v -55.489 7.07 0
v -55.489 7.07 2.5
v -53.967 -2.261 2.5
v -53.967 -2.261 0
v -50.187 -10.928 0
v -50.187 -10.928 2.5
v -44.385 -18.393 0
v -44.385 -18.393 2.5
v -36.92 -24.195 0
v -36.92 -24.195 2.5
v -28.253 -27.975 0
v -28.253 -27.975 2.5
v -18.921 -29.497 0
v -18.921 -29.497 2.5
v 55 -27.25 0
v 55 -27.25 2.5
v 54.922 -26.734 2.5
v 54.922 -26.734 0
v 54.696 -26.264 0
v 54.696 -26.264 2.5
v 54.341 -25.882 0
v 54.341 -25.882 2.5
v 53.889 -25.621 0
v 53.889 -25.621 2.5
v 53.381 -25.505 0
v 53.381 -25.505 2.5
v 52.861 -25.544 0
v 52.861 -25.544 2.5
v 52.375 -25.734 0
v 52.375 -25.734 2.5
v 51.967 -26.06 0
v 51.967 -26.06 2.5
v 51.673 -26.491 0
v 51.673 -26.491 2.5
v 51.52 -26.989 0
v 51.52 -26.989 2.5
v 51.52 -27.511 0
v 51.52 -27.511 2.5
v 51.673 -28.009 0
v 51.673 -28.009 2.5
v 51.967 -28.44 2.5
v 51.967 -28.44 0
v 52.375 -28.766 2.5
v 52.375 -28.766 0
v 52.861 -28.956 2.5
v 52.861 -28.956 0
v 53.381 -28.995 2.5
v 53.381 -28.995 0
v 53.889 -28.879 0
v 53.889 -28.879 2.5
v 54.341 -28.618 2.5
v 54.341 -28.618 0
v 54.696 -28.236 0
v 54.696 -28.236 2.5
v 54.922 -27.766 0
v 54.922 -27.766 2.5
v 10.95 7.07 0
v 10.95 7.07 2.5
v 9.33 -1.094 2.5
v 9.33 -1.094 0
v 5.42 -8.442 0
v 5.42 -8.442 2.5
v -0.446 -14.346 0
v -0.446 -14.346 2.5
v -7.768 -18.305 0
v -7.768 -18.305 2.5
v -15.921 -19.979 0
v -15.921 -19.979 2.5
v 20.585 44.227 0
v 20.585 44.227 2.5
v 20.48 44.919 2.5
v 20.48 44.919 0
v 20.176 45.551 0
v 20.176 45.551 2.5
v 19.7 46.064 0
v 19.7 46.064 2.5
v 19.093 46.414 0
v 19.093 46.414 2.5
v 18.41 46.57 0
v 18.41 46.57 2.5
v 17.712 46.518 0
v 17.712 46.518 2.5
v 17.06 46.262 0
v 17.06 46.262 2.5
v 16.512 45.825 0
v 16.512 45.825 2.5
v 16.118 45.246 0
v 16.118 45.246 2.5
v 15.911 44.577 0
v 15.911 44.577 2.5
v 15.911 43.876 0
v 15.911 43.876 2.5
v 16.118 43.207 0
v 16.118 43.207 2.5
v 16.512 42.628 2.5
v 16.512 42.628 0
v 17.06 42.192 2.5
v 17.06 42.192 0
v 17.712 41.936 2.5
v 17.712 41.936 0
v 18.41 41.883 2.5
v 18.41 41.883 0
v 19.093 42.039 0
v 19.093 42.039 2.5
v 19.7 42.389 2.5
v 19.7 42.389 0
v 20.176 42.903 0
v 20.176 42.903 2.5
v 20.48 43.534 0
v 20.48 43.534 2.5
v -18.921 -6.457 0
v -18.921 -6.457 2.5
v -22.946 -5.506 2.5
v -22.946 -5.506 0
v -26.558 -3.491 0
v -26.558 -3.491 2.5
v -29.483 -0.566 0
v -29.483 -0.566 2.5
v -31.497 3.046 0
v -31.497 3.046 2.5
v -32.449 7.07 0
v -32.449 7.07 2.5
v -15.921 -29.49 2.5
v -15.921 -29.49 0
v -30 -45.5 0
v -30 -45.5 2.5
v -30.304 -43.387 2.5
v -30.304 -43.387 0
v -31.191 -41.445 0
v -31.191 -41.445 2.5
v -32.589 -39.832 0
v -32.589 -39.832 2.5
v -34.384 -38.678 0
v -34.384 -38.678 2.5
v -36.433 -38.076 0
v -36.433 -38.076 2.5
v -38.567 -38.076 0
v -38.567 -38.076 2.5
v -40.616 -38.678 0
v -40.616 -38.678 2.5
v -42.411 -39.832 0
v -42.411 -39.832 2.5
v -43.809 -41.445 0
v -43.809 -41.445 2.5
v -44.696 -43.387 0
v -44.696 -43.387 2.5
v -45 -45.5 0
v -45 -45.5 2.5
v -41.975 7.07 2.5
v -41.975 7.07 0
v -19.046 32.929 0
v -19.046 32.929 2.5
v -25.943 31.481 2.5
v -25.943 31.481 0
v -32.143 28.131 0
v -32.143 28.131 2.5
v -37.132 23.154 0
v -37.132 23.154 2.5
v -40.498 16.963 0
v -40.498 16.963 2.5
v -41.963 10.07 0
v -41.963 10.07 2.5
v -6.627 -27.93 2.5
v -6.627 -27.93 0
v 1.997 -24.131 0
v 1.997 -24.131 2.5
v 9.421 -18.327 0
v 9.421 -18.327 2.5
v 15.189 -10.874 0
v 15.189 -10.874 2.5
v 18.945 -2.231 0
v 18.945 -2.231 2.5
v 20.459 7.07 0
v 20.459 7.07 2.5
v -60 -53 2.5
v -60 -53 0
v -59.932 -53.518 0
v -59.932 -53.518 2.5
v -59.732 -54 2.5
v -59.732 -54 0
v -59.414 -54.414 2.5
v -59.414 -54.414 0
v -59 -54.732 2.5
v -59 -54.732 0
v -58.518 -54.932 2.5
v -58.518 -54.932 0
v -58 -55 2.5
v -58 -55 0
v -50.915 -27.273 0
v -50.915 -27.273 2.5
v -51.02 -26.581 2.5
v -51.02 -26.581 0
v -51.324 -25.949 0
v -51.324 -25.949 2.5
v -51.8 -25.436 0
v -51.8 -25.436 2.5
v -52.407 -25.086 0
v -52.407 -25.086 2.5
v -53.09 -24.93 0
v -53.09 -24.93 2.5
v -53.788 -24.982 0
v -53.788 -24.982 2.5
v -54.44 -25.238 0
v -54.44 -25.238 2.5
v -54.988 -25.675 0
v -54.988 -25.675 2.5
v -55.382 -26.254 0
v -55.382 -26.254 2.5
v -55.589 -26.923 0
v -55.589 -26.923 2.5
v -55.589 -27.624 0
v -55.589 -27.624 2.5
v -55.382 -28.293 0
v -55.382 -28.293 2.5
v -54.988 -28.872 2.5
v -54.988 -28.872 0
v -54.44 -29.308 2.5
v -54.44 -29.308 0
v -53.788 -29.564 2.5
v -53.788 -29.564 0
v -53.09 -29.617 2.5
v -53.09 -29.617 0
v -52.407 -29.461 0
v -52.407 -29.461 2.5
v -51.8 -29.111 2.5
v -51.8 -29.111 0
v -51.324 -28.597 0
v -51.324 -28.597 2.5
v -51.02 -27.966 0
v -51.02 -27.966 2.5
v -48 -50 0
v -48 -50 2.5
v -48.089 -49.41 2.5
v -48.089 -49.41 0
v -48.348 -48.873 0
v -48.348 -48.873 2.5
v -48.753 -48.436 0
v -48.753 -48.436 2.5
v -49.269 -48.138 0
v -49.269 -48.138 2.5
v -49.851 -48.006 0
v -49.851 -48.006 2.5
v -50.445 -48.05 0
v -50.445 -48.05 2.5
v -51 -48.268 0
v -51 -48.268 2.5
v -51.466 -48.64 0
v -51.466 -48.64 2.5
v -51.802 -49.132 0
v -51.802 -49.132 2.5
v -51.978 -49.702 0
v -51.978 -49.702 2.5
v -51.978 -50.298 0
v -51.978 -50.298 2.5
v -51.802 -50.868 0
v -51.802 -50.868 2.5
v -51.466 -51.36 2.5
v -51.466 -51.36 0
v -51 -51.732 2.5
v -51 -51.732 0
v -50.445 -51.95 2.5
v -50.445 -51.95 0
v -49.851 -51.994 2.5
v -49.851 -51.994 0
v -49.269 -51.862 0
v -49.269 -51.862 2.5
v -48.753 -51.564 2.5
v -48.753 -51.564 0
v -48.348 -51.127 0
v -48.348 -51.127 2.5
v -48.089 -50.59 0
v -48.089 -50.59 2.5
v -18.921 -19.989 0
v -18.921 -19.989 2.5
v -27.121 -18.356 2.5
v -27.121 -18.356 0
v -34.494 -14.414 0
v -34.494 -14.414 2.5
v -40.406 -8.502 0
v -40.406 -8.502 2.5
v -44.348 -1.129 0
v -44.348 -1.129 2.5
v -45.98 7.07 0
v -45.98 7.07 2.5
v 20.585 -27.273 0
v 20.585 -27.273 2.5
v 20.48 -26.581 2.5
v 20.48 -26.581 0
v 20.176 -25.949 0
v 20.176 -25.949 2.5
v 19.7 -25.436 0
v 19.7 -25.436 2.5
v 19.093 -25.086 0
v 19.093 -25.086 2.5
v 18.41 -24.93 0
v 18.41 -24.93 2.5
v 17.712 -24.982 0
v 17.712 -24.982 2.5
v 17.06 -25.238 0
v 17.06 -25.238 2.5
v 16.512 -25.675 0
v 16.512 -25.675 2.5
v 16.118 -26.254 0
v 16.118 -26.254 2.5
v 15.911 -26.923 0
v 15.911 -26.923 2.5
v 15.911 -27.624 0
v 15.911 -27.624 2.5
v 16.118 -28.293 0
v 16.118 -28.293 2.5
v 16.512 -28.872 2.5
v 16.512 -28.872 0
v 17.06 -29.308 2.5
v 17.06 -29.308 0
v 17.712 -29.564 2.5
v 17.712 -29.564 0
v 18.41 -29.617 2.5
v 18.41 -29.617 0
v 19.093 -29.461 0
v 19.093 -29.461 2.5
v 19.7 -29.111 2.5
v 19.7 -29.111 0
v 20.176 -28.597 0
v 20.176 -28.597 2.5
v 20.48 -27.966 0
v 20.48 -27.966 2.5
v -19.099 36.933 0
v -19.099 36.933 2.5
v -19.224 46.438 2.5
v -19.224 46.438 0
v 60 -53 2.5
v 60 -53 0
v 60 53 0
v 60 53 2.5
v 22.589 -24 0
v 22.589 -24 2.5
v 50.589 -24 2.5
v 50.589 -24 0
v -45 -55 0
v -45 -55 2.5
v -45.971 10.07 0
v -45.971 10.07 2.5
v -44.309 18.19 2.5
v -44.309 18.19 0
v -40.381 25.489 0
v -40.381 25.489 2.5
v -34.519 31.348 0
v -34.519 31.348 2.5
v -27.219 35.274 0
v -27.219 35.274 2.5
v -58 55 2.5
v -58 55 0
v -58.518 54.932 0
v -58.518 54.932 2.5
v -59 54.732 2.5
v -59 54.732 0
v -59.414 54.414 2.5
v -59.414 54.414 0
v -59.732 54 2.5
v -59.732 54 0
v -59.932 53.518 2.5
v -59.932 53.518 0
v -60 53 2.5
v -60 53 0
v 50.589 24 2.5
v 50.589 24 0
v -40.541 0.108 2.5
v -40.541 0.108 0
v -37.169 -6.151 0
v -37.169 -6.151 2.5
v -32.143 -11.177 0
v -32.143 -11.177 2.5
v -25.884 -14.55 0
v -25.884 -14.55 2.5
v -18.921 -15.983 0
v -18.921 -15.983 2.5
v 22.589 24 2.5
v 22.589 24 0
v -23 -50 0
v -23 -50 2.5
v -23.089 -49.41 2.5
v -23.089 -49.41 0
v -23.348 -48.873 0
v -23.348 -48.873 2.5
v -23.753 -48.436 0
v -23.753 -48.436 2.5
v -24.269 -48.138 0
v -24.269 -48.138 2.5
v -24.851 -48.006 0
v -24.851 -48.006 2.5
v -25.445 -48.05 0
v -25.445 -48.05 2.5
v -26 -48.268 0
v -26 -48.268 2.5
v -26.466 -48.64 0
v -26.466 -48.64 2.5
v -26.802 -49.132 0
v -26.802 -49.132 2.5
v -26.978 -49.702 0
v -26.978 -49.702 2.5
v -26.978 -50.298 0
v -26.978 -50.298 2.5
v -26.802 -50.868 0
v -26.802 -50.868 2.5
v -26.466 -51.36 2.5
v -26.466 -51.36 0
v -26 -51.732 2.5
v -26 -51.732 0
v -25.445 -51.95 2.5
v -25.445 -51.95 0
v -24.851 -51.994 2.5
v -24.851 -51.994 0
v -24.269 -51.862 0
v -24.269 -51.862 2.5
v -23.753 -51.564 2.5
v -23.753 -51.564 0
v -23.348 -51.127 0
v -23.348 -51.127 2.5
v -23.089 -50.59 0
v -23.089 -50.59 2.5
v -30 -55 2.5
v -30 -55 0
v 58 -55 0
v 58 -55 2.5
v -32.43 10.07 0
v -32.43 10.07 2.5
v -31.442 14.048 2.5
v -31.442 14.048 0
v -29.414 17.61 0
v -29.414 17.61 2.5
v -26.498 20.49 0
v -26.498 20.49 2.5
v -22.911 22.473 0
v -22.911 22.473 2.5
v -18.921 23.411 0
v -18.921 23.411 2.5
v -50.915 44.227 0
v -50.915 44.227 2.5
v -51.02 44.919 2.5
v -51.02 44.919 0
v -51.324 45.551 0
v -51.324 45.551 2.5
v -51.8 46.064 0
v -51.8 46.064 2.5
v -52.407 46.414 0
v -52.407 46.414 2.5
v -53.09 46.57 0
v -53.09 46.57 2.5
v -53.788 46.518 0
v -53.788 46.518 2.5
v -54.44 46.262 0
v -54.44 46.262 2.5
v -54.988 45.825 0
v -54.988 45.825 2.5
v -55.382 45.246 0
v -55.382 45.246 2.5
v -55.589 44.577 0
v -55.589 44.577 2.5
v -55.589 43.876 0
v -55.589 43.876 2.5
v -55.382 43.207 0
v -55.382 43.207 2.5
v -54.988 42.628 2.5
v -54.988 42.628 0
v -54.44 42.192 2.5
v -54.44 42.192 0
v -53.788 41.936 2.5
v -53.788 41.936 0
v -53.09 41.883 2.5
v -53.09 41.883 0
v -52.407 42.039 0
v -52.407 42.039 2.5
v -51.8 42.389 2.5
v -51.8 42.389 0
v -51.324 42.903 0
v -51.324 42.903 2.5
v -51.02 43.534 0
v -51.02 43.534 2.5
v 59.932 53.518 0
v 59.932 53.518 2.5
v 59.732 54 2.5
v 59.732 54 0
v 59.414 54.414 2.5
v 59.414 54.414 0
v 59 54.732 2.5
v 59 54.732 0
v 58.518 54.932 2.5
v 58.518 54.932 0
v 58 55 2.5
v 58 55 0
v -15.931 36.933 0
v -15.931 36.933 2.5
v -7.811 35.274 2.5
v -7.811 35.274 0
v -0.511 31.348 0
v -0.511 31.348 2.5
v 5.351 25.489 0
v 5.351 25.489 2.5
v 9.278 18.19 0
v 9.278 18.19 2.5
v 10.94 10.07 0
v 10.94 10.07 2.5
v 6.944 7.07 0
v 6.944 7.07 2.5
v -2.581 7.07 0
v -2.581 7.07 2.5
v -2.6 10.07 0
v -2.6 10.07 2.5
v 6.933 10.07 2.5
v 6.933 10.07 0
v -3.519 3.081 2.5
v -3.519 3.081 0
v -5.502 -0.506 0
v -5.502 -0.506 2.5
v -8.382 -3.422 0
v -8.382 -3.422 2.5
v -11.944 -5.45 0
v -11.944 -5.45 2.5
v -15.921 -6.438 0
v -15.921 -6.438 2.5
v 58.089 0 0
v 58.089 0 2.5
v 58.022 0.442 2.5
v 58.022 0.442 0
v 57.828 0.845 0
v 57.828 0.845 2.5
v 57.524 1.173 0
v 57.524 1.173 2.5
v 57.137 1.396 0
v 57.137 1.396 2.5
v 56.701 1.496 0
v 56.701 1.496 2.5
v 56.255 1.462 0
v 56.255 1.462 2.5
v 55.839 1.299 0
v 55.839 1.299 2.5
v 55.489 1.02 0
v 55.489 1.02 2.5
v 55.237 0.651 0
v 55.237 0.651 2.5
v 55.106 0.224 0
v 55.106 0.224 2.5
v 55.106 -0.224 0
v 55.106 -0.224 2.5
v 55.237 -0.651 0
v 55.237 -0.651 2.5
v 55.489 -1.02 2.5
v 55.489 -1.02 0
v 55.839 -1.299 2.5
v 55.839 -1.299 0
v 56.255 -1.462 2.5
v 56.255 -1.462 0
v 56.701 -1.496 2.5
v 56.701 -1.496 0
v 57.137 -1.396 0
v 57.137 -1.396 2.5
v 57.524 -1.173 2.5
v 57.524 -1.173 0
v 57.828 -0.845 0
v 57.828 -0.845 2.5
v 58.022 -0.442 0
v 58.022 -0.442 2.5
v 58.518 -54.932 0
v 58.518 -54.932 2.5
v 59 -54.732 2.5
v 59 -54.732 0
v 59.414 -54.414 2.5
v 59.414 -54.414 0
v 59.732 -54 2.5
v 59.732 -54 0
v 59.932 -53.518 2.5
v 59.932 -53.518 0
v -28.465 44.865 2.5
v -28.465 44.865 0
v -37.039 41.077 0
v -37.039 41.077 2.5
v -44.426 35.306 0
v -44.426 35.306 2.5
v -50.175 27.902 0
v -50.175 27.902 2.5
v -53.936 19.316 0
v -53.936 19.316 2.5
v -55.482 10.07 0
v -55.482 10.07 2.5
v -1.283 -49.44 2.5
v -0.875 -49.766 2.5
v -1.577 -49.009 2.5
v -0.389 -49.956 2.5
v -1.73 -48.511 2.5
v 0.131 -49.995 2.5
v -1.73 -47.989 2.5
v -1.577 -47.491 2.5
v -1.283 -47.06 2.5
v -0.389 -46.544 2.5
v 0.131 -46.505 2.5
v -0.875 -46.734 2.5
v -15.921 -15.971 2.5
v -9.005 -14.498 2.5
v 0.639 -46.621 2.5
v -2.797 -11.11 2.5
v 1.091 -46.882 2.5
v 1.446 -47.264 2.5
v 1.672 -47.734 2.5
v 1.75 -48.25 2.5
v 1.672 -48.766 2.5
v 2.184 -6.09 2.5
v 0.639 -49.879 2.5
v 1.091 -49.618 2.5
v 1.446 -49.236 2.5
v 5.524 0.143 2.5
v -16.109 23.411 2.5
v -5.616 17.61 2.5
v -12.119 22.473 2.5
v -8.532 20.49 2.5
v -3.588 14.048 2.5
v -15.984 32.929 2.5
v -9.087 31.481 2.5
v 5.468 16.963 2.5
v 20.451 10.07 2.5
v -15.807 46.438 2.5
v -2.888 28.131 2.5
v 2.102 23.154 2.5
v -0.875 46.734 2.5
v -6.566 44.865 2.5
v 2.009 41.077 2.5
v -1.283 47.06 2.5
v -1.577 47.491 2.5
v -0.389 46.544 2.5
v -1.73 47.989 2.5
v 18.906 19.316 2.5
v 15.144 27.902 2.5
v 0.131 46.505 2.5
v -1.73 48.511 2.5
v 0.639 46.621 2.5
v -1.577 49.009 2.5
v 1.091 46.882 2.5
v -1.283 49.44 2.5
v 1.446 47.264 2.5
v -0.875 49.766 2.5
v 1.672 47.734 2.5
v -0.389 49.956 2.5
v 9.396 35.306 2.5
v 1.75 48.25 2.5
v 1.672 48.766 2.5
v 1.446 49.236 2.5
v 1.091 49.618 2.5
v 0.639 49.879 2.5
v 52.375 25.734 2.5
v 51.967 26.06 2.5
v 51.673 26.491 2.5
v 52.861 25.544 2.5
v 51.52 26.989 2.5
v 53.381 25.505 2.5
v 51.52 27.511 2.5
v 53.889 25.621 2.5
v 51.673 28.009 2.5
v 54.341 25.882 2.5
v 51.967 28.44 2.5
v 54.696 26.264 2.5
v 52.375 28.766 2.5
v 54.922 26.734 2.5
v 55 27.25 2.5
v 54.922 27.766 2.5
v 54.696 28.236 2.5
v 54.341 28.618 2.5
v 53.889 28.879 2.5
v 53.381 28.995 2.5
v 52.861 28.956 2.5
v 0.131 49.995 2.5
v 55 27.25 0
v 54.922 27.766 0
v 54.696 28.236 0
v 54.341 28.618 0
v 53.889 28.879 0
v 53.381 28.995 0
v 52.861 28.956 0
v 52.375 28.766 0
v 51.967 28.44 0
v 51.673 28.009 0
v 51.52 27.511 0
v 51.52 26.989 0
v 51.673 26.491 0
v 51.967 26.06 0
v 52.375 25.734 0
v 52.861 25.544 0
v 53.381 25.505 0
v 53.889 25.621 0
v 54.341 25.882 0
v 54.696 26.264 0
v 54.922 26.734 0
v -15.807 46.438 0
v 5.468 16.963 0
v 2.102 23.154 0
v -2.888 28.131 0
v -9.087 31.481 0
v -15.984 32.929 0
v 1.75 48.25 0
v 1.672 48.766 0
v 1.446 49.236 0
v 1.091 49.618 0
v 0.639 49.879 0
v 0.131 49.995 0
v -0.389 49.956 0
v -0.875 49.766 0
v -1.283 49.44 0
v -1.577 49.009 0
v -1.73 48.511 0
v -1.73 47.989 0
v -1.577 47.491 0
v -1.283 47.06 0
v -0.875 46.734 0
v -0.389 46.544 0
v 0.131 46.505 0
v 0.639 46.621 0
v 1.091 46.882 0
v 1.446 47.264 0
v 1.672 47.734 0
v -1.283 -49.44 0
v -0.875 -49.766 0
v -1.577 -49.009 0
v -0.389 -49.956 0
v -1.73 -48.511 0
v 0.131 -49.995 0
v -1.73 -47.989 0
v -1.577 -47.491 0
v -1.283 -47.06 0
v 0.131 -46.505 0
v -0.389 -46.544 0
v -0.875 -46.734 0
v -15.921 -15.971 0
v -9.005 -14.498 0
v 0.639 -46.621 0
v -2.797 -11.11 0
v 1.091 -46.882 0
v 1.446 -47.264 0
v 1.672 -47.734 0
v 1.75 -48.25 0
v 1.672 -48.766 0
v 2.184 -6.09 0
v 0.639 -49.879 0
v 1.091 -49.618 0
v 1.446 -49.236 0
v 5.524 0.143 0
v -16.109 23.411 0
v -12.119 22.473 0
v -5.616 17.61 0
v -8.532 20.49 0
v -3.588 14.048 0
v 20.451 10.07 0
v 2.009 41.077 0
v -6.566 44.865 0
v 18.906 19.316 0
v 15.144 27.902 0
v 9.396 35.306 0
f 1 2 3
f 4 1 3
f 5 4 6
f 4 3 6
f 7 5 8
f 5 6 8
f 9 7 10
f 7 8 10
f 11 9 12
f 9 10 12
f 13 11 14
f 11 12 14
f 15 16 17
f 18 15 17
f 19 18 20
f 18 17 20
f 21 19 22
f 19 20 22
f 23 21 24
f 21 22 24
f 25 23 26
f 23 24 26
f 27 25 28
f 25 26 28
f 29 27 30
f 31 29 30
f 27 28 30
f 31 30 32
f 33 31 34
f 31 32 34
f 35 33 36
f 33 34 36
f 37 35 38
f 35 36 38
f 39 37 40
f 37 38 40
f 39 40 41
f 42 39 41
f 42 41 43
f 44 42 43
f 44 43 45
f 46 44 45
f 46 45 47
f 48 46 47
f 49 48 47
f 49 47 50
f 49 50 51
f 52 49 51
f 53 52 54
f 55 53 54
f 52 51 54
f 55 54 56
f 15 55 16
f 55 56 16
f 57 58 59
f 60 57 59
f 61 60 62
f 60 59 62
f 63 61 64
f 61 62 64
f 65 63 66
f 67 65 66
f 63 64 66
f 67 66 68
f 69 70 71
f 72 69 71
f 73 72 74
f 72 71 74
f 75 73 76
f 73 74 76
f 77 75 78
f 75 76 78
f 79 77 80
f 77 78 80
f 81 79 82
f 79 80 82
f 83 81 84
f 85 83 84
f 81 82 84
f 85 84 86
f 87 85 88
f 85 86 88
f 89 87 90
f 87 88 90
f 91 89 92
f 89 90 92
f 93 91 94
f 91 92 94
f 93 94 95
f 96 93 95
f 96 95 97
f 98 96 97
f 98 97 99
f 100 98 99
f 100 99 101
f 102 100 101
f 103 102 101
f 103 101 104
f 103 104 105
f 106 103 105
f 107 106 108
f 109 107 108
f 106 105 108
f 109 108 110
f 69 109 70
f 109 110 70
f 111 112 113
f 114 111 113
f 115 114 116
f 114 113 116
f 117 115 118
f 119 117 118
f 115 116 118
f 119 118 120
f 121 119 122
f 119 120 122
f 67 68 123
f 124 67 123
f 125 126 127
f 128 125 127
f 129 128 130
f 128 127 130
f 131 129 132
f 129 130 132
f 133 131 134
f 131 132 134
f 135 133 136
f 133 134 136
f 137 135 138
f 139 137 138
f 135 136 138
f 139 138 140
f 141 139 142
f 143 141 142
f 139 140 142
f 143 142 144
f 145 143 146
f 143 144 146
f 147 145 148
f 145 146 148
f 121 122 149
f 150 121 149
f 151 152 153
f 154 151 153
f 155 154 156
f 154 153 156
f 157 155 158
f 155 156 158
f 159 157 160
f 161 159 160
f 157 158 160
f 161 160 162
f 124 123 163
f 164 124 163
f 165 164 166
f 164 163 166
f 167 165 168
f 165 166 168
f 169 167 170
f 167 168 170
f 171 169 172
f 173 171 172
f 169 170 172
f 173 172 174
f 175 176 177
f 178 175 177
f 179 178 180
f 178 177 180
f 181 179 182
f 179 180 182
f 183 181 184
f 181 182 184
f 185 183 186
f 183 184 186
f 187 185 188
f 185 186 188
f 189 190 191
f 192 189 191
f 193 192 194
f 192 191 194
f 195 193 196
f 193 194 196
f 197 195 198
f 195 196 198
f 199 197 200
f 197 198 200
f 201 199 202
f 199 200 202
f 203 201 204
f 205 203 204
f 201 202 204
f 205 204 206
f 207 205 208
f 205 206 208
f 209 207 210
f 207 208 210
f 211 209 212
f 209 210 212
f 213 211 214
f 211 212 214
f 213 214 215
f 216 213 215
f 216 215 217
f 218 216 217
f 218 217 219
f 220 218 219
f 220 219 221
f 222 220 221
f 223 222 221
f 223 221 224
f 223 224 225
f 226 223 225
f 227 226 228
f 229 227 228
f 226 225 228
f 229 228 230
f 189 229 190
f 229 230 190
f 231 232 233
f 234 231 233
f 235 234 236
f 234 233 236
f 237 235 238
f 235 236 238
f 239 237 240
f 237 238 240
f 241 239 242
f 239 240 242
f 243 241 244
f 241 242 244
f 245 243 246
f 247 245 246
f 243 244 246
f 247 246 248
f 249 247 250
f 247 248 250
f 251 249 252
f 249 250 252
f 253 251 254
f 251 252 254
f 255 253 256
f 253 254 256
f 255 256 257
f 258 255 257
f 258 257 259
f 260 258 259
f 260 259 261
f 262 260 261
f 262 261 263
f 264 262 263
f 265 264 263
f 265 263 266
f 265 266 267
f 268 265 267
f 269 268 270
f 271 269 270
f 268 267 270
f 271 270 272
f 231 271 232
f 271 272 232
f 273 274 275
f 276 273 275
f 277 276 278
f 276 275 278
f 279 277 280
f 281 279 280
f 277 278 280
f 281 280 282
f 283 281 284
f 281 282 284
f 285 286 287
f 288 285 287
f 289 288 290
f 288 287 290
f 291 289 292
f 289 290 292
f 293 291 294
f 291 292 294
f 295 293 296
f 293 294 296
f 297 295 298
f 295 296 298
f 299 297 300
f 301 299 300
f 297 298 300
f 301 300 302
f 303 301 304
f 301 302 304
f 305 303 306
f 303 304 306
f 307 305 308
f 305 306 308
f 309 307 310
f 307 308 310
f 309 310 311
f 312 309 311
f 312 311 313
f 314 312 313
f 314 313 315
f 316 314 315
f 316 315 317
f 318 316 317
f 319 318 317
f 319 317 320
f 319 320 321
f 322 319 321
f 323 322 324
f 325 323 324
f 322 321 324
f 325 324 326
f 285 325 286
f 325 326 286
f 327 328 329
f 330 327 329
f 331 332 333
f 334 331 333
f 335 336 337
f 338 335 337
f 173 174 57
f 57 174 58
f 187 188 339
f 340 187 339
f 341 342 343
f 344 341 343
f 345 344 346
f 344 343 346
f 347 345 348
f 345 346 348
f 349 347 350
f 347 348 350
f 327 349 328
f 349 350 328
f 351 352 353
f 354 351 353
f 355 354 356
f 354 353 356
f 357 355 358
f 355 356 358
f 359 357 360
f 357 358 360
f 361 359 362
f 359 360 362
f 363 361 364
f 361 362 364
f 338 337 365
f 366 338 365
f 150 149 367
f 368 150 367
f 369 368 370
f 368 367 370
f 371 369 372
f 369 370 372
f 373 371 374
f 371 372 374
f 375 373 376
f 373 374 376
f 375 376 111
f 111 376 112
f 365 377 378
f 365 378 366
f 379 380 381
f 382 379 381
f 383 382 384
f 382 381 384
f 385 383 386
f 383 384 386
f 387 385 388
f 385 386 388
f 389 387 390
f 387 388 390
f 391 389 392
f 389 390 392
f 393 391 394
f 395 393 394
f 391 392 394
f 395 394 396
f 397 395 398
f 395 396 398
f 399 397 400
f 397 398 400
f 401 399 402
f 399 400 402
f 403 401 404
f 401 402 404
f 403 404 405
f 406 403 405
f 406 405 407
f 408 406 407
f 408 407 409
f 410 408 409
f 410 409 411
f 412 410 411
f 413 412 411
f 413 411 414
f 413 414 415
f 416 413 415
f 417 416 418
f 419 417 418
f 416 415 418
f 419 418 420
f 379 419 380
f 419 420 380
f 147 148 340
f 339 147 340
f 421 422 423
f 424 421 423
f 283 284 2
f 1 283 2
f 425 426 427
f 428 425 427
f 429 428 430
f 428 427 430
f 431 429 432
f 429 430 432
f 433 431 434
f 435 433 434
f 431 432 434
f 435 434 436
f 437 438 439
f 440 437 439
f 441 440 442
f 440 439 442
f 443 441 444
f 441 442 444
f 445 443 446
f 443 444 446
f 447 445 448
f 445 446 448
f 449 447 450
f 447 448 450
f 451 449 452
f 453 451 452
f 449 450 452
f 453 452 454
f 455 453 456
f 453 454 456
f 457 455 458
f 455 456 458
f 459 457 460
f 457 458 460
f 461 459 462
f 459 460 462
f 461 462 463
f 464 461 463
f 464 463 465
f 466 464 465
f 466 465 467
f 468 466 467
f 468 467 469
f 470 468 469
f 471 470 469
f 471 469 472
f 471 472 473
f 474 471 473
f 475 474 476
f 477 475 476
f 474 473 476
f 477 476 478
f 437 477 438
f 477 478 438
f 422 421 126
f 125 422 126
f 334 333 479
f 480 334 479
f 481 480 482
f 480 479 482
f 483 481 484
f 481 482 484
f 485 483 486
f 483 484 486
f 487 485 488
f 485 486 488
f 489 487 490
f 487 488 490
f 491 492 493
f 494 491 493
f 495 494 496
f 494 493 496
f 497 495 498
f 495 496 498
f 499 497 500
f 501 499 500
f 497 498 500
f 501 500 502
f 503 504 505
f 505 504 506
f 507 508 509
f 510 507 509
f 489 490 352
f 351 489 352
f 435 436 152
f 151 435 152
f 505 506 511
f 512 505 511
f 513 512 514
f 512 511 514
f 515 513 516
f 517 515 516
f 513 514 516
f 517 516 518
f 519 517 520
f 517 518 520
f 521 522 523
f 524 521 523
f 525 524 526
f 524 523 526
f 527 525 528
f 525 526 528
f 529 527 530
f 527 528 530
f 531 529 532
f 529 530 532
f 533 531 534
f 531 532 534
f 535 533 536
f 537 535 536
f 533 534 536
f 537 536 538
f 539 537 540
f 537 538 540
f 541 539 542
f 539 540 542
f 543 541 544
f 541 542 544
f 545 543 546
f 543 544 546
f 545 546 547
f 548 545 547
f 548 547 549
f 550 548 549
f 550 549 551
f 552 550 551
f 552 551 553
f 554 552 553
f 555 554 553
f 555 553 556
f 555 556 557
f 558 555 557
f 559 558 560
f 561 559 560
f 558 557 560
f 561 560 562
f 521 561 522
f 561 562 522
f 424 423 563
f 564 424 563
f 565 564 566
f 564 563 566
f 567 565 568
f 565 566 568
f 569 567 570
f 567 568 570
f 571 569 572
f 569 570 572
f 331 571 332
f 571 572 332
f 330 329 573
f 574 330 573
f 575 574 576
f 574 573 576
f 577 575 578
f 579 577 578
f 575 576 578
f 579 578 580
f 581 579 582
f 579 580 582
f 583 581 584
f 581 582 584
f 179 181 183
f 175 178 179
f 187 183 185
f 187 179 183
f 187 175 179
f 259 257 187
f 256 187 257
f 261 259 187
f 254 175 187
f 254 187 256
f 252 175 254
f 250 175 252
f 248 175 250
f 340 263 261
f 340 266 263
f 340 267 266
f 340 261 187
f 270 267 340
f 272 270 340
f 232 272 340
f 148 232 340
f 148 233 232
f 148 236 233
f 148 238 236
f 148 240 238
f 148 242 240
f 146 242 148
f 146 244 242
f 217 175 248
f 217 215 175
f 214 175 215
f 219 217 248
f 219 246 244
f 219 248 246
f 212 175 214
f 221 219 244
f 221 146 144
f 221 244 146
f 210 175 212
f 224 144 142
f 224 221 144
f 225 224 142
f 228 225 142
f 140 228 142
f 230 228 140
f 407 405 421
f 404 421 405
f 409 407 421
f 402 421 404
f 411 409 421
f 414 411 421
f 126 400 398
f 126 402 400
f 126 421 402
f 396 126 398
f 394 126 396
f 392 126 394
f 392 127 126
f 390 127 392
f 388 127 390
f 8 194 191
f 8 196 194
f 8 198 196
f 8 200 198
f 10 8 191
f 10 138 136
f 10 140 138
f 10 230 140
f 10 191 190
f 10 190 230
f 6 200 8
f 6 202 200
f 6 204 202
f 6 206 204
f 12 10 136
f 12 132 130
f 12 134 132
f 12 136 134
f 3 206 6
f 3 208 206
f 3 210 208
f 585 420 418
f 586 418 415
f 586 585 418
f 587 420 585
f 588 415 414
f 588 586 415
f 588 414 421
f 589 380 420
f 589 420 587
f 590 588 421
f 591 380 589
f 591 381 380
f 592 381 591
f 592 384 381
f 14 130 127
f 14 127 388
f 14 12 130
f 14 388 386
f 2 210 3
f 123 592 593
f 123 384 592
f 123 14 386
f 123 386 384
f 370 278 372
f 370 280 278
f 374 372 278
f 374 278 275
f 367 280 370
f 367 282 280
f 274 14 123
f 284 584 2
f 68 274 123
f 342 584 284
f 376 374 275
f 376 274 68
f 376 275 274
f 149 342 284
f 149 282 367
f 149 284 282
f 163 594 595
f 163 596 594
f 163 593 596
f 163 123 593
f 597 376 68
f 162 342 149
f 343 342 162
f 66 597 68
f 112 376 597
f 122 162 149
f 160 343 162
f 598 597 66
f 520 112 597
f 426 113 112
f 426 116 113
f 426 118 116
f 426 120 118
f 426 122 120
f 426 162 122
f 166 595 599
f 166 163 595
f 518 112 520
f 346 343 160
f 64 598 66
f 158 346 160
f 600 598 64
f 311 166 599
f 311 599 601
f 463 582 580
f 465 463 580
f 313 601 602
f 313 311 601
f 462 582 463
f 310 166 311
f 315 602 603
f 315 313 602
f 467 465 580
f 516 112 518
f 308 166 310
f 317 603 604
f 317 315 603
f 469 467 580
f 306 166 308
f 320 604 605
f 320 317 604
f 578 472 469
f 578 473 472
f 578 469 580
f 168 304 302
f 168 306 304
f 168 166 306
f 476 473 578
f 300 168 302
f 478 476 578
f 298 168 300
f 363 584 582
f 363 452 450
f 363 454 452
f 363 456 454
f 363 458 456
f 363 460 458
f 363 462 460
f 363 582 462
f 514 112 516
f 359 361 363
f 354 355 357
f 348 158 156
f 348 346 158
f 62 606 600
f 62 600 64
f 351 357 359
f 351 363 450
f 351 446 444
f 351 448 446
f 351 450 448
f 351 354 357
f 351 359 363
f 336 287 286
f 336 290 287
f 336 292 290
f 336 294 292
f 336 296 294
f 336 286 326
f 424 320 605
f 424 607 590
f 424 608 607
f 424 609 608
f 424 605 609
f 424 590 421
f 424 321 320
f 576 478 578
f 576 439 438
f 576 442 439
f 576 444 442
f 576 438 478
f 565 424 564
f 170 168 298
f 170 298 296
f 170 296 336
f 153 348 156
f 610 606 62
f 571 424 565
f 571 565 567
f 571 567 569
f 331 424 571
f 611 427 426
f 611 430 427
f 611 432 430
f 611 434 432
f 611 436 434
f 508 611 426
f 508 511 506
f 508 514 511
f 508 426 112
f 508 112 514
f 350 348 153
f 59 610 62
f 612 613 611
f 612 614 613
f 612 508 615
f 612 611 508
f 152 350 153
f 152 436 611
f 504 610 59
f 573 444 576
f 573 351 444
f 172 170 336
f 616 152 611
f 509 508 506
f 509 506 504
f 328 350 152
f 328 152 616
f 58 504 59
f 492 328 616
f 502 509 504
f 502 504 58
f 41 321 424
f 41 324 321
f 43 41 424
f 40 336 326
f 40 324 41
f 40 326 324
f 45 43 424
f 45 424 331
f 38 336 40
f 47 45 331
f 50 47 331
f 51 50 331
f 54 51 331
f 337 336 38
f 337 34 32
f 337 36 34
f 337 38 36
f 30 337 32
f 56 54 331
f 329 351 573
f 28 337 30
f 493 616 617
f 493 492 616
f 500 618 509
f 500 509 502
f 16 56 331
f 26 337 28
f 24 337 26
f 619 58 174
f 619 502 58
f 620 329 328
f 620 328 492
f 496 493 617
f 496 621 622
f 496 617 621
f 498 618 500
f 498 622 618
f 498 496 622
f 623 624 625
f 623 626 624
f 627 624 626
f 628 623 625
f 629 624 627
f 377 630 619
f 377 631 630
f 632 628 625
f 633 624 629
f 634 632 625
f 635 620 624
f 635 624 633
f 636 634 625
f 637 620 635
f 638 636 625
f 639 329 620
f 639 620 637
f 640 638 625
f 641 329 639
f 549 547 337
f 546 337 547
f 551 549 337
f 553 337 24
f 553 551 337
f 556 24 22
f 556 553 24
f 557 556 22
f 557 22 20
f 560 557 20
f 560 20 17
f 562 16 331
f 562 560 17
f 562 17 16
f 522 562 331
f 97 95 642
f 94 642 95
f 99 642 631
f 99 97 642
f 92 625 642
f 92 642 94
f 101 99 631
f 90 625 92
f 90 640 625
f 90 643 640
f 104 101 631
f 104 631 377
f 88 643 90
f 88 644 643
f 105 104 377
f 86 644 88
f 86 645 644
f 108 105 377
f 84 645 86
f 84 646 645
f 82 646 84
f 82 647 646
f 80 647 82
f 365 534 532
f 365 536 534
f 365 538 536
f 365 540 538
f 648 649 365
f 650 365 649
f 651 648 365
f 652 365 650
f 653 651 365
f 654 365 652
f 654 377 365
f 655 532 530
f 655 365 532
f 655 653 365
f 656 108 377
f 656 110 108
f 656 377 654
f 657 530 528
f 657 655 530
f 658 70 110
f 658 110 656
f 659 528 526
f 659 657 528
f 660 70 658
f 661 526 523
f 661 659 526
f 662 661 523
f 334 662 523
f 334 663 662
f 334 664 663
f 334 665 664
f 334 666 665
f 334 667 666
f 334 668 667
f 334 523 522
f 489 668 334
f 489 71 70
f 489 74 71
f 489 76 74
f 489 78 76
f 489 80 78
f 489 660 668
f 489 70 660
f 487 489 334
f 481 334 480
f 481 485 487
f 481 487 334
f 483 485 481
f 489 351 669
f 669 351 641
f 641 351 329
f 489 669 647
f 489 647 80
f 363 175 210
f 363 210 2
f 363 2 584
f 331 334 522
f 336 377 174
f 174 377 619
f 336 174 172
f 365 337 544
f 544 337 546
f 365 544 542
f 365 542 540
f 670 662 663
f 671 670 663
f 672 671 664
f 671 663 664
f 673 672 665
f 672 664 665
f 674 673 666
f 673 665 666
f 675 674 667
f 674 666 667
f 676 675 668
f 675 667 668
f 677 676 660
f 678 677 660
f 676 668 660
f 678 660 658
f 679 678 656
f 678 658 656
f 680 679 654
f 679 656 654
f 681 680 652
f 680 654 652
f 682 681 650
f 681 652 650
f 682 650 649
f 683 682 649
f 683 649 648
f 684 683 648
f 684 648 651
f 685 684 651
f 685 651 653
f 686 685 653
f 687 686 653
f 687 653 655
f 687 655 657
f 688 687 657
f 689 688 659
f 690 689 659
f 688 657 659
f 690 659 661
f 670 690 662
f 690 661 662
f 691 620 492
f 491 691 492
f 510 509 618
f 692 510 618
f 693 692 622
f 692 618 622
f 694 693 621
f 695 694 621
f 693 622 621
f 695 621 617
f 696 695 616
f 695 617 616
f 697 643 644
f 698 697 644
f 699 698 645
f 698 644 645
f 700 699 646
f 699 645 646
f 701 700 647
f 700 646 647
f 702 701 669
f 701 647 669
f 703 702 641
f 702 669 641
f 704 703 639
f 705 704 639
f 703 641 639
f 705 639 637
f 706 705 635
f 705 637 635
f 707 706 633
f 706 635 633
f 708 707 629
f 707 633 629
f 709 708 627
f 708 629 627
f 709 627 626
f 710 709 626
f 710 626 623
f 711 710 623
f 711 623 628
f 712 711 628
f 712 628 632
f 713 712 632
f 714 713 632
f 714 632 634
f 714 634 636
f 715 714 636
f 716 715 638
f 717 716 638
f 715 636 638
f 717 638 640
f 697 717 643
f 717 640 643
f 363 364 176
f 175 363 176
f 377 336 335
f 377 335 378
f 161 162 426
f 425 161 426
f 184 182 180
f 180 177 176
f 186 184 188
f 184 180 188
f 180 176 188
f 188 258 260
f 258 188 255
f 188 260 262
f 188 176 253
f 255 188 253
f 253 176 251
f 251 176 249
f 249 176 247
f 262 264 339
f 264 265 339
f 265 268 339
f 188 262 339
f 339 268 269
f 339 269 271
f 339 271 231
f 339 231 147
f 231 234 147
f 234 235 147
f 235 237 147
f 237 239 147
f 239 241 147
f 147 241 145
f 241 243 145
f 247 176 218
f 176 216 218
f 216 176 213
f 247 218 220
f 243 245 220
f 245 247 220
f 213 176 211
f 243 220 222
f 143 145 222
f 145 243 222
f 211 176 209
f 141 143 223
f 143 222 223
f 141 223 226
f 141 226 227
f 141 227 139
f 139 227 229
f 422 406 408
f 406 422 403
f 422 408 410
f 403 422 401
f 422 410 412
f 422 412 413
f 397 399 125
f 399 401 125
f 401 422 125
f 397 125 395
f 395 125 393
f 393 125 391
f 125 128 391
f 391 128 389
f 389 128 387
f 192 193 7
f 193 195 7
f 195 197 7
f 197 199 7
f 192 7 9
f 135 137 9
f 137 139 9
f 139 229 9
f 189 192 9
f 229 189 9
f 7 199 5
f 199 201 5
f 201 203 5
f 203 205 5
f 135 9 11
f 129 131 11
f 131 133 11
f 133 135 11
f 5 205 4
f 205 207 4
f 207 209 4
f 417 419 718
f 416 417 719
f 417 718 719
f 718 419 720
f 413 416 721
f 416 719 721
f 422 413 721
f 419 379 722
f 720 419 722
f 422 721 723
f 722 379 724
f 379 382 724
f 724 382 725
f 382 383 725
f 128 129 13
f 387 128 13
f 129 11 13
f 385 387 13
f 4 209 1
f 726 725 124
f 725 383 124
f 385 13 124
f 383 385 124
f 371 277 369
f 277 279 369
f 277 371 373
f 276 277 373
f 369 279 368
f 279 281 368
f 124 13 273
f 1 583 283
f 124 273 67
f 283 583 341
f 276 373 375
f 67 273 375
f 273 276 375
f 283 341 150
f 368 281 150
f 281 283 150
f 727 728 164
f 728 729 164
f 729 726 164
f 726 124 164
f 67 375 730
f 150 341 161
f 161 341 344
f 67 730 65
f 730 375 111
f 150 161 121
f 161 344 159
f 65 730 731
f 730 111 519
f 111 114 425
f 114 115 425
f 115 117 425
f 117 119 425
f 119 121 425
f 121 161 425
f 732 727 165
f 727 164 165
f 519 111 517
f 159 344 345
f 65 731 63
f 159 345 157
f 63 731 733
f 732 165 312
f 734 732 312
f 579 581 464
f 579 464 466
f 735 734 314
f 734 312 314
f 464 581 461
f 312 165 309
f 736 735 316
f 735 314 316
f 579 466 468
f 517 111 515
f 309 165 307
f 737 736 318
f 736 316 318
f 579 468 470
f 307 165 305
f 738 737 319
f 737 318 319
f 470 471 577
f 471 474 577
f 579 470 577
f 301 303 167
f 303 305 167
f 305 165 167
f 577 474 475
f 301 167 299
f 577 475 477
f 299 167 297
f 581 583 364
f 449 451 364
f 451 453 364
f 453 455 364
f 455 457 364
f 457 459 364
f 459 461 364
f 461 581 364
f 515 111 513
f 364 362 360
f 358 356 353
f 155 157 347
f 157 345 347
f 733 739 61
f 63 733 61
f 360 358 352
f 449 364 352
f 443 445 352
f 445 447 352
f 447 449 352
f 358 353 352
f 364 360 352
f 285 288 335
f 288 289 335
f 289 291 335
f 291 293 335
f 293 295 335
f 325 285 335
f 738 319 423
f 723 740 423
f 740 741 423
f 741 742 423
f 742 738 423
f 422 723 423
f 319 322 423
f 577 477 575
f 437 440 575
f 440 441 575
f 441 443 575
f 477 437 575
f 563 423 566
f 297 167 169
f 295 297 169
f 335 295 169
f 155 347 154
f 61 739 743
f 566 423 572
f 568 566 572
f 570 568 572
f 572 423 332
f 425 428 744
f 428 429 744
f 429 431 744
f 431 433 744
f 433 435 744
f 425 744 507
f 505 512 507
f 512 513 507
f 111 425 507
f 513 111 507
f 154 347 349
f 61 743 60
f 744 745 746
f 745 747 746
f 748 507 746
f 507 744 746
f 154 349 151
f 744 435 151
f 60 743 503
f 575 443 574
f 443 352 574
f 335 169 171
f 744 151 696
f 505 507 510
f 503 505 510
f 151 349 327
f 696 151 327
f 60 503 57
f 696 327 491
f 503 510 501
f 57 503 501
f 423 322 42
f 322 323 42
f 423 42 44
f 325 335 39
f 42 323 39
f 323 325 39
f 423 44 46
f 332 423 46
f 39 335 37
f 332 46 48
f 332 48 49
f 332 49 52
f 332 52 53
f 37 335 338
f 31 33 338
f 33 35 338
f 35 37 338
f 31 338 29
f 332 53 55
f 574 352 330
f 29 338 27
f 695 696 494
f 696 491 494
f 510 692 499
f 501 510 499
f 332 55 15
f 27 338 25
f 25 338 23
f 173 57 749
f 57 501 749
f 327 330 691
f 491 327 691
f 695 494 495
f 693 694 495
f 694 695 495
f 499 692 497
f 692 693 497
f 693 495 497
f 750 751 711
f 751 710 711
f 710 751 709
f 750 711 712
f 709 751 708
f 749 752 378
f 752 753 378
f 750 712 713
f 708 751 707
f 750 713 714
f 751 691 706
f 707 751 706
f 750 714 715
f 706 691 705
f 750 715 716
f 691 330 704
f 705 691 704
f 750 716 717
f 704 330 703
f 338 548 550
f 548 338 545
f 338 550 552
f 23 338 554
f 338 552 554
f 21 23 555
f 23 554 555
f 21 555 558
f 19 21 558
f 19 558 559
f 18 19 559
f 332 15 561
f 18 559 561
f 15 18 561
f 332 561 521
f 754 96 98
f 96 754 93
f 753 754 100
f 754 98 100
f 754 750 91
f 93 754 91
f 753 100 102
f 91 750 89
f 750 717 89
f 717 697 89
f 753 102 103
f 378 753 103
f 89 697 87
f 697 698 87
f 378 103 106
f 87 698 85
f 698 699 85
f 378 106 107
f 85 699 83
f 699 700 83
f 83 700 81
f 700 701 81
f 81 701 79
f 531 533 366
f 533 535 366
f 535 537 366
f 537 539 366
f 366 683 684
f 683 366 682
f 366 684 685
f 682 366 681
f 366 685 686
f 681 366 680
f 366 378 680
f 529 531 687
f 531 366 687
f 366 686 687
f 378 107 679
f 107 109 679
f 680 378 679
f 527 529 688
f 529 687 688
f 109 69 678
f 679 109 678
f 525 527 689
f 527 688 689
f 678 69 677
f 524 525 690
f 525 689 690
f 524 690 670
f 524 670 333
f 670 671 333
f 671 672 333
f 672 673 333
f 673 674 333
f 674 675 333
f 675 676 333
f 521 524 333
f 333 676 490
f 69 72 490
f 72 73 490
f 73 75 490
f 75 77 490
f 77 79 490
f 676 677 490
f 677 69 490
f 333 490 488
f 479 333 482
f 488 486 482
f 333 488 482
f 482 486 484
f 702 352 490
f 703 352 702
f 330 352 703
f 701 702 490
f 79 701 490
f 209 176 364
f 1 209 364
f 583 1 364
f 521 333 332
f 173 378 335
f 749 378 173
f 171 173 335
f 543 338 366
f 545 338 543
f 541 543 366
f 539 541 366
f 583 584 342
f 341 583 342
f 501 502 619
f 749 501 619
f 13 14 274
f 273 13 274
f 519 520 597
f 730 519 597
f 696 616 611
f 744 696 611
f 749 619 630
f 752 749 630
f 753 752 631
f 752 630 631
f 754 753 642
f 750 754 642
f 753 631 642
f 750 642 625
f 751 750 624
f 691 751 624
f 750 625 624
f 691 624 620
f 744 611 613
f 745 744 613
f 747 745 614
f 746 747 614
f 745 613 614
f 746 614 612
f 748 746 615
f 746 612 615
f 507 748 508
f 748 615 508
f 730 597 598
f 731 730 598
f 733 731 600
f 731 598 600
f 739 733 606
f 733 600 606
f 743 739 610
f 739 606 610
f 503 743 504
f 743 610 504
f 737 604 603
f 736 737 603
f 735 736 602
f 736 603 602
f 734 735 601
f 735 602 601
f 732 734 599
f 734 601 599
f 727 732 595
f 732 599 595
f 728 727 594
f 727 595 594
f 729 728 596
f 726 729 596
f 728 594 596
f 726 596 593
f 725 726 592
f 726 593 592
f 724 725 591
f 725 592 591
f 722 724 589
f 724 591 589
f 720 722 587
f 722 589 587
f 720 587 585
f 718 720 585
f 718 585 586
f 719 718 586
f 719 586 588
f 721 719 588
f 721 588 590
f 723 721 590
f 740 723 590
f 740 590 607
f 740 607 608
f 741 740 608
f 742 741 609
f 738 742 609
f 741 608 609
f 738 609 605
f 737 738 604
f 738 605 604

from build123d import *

# Parameters (mm, degrees)
F1_DEPTH = 2.5
F2_R     = 1.75
F3_DEPTH = 2.5
F4_R     = 2.35
F4_R_2   = 2
F5_DEPTH = 2.5
F6_W     = 28
F6_H     = 48
F6_R     = 1.5
F7_DEPTH = 2.5


with BuildPart() as f1:
    # F0 (on Top) → F1 (new body)
    with BuildSketch(Plane.XY):
        with BuildLine():
            Line((58, 55), (-58, 55))
            ThreePointArc((-58, 55), (-59.414214, 54.414214), (-60, 53))
            Line((-60, 53), (-60, -53))
            ThreePointArc((-60, -53), (-59.414214, -54.414214), (-58, -55))
            Line((-58, -55), (58, -55))
            ThreePointArc((58, -55), (59.414214, -54.414214), (60, -53))
            Line((60, -53), (60, 53))
            ThreePointArc((60, 53), (59.414214, 54.414214), (58, 55))
        make_face()
    extrude(amount=F1_DEPTH)

    # F2 (on face) → F3 (cut, through all)
    with BuildSketch(Plane.XY.offset(2.5)):
        with Locations((53.25, 27.25)):
            Circle(F2_R)
        with Locations((0, 48.25)):
            Circle(F2_R)
        with Locations((0, -48.25)):
            Circle(F2_R)
        with Locations((53.25, -27.25)):
            Circle(F2_R)
        with Locations((-53.25, -27.25)):
            Circle(F2_R)
    extrude(amount=-F3_DEPTH, mode=Mode.SUBTRACT)

    # F4 (on face) → F5 (cut, through all)
    with BuildSketch(Plane.XY.offset(2.5)):
        with BuildLine():
            Line((-45, -45.5), (-45, -55))
            Line((-45, -55), (-30, -55))
            Line((-30, -55), (-30, -45.5))
            ThreePointArc((-30, -45.5), (-37.5, -38), (-45, -45.5))
        make_face()
        with Locations((-53.265178, 44.226708)):
            Circle(F4_R)
        with Locations((18.234822, 44.226708)):
            Circle(F4_R)
        with Locations((-53.265178, -27.273292)):
            Circle(F4_R)
        with Locations((18.234822, -27.273292)):
            Circle(F4_R)
        with BuildLine():
            ThreePointArc((-18.921428, -6.457228), (-28.121779, -2.129894), (-32.449114, 7.070458))
            Line((-32.449114, 7.070458), (-41.974786, 7.070458))
            ThreePointArc((-41.974786, 7.070458), (-34.839294, -8.847408), (-18.921428, -15.982901))
            Line((-18.921428, -15.982901), (-18.921428, -6.457228))
        make_face()
        with BuildLine():
            ThreePointArc((-18.921428, -19.988577), (-37.667721, -11.675835), (-45.980463, 7.070458))
            Line((-45.980463, 7.070458), (-55.489148, 7.070458))
            ThreePointArc((-55.489148, 7.070458), (-44.385235, -18.39335), (-18.921428, -29.497263))
            Line((-18.921428, -29.497263), (-18.921428, -19.988577))
        make_face()
        with BuildLine():
            ThreePointArc((-19.223845, 46.438274), (-44.425872, 35.306067), (-55.481741, 10.070458))
            Line((-55.481741, 10.070458), (-45.970581, 10.070458))
            ThreePointArc((-45.970581, 10.070458), (-37.664209, 28.632763), (-19.099009, 36.932665))
            Line((-19.099009, 36.932665), (-19.223845, 46.438274))
        make_face()
        with BuildLine():
            Line((-15.921428, -19.978695), (-15.921428, -29.489856))
            ThreePointArc((-15.921428, -29.489856), (9.421141, -18.326925), (20.458793, 7.070458))
            Line((20.458793, 7.070458), (10.950108, 7.070458))
            ThreePointArc((10.950108, 7.070458), (2.70364, -11.609343), (-15.921428, -19.978695))
        make_face()
        with BuildLine():
            ThreePointArc((-16.108928, 23.410645), (-6.97541, 19.149726), (-2.600086, 10.070458))
            Line((-2.600086, 10.070458), (6.93293, 10.070458))
            ThreePointArc((6.93293, 10.070458), (-0.213218, 25.822952), (-15.983928, 32.92881))
            Line((-15.983928, 32.92881), (-16.108928, 23.410645))
        make_face()
        with BuildLine():
            ThreePointArc((-15.931346, 36.932665), (2.633853, 28.632763), (10.940225, 10.070458))
            Line((10.940225, 10.070458), (20.451386, 10.070458))
            ThreePointArc((20.451386, 10.070458), (9.395517, 35.306067), (-15.806511, 46.438274))
            Line((-15.806511, 46.438274), (-15.931346, 36.932665))
        make_face()
        with BuildLine():
            ThreePointArc((-2.581241, 7.070458), (-6.84216, -2.063059), (-15.921428, -6.438384))
            Line((-15.921428, -6.438384), (-15.921428, -15.971399))
            ThreePointArc((-15.921428, -15.971399), (-0.124773, -8.780865), (6.944431, 7.070458))
            Line((6.944431, 7.070458), (-2.581241, 7.070458))
        make_face()
        with BuildLine():
            Line((-18.921428, 23.410645), (-19.046428, 32.92881))
            ThreePointArc((-19.046428, 32.92881), (-34.817137, 25.822952), (-41.963285, 10.070458))
            Line((-41.963285, 10.070458), (-32.430269, 10.070458))
            ThreePointArc((-32.430269, 10.070458), (-28.054945, 19.149726), (-18.921428, 23.410645))
        make_face()
        with Locations((-50, -50)):
            Circle(F4_R_2)
        with Locations((-25, -50)):
            Circle(F4_R_2)
    extrude(amount=-F5_DEPTH, mode=Mode.SUBTRACT)

    # F6 (on face) → F7 (cut, through all)
    with BuildSketch(Plane.XY.offset(2.5)):
        with Locations((36.588879, 0)):
            Rectangle(F6_W, F6_H)
        with Locations((56.588879, 0)):
            Circle(F6_R)
    extrude(amount=-F7_DEPTH, mode=Mode.SUBTRACT)


solid = f1.part
